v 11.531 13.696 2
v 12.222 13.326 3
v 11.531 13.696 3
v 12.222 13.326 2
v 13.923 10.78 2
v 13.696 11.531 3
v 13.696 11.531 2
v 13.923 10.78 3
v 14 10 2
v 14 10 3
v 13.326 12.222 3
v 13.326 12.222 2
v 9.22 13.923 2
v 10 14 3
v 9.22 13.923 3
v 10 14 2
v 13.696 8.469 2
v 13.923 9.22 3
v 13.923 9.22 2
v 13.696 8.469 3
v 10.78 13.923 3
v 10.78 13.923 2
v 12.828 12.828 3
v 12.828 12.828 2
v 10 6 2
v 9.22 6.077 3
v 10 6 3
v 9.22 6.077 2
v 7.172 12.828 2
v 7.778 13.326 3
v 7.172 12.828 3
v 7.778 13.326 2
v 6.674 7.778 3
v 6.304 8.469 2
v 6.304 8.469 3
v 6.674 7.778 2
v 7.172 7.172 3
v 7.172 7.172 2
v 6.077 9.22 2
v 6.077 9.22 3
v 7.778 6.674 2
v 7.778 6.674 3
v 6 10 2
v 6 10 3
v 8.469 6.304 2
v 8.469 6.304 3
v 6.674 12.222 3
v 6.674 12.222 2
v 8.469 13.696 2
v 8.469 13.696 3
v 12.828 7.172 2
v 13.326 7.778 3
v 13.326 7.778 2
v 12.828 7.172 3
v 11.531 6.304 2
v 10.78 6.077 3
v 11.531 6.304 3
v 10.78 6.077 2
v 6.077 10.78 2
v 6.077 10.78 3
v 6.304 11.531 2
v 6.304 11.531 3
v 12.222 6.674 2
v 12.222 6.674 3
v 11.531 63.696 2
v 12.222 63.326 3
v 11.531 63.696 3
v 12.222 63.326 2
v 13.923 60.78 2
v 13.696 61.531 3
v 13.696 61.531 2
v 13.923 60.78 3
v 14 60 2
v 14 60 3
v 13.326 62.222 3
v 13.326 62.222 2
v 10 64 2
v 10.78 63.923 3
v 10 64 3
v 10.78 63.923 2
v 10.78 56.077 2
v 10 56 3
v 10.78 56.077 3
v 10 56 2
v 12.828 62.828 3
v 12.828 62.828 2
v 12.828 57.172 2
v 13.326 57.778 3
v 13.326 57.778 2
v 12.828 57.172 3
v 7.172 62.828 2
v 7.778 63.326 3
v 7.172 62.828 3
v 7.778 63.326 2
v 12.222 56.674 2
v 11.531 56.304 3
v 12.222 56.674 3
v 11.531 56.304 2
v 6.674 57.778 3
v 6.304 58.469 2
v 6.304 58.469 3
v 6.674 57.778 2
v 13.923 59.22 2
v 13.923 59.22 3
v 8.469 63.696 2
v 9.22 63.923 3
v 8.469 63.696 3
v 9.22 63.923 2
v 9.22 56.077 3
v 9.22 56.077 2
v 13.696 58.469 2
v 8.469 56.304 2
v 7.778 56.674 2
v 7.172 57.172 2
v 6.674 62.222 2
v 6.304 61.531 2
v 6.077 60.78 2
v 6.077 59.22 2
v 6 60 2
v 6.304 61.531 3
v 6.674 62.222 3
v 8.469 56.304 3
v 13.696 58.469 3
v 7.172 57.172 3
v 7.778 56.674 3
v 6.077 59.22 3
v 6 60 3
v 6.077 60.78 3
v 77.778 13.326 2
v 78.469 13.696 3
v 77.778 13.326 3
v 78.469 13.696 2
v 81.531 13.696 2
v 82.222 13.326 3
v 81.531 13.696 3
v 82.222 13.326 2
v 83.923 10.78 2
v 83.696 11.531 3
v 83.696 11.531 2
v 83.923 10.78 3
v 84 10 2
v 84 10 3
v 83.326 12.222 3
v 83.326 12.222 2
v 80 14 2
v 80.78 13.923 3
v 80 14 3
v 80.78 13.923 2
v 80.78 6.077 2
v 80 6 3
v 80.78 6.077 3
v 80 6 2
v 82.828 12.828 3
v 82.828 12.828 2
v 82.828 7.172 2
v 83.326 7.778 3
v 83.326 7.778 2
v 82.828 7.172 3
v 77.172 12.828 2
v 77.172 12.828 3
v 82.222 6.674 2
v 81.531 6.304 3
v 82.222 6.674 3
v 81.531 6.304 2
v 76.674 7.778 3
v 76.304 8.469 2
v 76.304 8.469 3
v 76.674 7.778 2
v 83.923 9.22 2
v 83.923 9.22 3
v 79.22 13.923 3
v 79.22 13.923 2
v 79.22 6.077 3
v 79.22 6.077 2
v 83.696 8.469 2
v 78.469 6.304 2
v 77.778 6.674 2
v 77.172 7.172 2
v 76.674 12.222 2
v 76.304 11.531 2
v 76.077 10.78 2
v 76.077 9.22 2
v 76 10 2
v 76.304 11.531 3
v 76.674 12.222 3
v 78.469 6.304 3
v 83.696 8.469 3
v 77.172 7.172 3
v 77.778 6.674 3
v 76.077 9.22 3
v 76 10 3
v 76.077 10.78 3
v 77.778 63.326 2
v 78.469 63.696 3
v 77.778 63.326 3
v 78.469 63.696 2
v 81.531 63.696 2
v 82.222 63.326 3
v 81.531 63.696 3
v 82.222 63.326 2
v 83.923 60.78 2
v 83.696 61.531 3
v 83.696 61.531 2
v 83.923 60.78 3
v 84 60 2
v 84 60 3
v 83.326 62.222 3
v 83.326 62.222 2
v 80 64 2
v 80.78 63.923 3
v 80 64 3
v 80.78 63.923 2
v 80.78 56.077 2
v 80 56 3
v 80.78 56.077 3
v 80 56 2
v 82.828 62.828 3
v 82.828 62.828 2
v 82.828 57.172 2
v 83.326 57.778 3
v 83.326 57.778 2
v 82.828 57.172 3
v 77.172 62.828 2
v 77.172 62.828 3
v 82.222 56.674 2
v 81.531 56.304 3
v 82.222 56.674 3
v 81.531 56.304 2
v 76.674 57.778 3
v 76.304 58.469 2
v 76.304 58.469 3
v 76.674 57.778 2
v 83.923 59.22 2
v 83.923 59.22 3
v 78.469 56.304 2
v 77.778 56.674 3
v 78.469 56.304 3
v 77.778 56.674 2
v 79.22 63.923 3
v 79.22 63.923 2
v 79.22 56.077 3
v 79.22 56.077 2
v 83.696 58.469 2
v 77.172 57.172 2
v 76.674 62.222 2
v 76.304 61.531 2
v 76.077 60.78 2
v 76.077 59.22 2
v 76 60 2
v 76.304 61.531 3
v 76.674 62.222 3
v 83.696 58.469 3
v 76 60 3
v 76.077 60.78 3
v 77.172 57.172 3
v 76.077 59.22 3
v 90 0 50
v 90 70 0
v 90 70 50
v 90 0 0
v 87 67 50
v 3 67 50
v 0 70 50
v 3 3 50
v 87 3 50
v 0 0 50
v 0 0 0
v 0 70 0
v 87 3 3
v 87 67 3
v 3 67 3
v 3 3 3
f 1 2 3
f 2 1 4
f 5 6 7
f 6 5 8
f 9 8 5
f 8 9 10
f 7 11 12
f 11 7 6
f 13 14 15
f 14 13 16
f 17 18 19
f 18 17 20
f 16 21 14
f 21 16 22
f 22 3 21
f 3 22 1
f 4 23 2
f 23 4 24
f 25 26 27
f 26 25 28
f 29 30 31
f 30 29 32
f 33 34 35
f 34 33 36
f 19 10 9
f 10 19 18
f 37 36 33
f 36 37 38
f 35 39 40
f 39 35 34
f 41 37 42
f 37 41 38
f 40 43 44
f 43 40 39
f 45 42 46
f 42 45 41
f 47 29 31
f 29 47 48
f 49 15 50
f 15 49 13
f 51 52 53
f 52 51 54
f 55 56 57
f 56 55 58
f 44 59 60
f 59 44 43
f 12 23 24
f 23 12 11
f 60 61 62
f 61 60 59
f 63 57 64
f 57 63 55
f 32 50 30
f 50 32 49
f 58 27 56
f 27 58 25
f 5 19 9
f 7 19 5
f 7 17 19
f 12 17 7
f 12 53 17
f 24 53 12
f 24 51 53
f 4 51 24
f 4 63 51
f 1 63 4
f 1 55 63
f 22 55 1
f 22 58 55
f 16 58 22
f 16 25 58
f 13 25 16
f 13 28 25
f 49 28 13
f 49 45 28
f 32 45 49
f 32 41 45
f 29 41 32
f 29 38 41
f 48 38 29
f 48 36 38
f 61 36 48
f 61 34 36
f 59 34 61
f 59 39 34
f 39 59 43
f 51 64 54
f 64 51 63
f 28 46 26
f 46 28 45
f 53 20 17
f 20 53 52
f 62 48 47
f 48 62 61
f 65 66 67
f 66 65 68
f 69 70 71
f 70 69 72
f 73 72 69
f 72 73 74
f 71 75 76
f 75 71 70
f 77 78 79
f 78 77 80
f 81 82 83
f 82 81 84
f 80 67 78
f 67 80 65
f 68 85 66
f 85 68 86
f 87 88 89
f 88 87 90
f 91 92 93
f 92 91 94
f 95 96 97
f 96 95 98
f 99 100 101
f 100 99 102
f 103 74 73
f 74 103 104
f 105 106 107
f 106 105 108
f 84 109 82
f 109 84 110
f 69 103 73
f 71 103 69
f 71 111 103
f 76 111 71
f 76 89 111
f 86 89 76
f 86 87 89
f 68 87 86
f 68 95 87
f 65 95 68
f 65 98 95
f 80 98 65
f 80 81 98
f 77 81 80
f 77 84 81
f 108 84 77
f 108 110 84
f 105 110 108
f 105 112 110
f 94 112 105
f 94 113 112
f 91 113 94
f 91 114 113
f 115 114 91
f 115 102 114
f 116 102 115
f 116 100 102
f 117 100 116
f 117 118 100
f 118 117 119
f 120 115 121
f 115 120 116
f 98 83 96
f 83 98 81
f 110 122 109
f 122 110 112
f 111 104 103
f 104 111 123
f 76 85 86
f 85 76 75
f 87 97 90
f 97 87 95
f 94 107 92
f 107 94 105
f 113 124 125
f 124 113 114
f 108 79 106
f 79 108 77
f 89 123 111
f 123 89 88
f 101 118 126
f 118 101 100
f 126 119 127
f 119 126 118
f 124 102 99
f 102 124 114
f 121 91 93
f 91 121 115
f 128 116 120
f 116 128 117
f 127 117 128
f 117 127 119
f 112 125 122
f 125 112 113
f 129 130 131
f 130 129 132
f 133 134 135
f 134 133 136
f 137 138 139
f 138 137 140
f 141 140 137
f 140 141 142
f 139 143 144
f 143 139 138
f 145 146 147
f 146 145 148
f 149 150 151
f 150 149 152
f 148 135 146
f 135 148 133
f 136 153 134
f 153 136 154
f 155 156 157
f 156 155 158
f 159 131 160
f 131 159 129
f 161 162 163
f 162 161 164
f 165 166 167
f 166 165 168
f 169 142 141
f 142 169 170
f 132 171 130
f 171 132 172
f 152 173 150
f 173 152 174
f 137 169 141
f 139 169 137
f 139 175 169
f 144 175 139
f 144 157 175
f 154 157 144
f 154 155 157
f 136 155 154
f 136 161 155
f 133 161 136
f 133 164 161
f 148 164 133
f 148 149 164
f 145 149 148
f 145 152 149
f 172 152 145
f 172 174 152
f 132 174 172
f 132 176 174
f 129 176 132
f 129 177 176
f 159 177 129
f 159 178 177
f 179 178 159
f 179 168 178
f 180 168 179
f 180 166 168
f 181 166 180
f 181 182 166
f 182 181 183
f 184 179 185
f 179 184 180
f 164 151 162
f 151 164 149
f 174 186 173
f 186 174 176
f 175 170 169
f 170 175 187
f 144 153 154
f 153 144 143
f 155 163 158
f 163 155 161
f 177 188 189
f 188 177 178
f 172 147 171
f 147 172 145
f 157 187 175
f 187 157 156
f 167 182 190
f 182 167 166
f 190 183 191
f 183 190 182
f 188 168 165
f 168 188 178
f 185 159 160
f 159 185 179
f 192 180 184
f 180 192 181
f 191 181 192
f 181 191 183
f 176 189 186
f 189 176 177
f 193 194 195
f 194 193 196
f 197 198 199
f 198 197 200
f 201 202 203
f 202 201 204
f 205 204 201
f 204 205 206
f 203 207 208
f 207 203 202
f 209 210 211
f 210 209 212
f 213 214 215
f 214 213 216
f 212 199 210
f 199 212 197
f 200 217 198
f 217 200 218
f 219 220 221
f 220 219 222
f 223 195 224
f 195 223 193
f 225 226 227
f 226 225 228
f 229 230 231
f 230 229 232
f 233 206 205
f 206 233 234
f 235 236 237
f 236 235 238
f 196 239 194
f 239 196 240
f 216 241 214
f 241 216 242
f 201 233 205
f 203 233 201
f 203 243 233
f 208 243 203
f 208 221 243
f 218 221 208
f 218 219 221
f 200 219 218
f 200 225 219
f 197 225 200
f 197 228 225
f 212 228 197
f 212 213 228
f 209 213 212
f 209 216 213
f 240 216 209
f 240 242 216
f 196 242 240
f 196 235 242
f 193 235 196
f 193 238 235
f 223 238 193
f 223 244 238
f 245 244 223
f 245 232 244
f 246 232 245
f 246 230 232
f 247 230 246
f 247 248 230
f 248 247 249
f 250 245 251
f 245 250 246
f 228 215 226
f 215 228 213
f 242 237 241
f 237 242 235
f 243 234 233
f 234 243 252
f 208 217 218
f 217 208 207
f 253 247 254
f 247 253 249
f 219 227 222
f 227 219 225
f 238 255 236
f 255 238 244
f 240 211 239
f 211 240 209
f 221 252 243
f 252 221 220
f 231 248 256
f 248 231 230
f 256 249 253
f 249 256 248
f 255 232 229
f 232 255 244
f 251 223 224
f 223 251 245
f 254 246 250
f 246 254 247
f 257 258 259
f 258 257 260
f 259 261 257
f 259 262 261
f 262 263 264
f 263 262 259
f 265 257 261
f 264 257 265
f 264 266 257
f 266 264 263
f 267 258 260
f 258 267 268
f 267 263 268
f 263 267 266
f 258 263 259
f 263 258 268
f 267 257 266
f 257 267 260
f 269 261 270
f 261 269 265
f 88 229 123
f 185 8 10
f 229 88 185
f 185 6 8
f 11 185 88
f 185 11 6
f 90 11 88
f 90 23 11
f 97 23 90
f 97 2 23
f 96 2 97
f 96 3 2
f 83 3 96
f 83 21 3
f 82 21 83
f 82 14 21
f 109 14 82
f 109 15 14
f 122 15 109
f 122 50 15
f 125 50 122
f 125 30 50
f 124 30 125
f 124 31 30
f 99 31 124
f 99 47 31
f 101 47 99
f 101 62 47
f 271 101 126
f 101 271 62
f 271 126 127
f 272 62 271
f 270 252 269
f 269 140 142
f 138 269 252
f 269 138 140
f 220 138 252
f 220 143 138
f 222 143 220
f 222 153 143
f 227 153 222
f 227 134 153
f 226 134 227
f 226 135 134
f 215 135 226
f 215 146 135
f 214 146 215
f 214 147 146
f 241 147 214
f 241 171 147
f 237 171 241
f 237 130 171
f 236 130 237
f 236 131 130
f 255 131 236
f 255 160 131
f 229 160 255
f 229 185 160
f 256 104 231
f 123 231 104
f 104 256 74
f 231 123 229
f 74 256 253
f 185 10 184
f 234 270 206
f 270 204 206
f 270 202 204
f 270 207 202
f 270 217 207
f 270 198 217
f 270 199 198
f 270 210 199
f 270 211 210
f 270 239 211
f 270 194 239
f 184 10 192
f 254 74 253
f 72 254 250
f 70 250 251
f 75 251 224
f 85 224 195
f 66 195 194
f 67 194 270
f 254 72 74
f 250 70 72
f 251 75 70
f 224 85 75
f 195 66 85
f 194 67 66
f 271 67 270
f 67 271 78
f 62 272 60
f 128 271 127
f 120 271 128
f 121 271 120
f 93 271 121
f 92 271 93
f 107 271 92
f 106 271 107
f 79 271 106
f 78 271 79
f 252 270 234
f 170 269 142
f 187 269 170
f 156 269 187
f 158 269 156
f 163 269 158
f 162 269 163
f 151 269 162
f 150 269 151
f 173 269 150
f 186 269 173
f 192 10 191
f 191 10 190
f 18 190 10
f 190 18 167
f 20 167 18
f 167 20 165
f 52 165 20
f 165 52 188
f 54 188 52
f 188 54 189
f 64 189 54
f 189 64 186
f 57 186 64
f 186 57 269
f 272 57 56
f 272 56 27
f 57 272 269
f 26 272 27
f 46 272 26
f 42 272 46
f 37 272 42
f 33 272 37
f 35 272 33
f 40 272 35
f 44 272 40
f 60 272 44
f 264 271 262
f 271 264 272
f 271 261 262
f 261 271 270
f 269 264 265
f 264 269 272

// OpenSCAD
$fn = 32;

// ----------------------------------------------------------------------
// Enclosure box: bosses enclosure
// ----------------------------------------------------------------------

// --- parameters (mm) ---
box_l = 90;               // outer length, X
box_w = 70;               // outer width, Y
box_h = 50;               // outer height
wall_t = 3;               // wall thickness
boss_r = 4;               // corner boss radius
hole_r = 2;               // boss screw hole radius
boss_in = 10;             // boss inset from the corners
fit_tol = 0.05;           // tolerance for press fits, mm
free_tol = 0.3;           // tolerance for clearance fits, mm

inner_h = box_h - wall_t;  // cavity depth
boss_h = inner_h - 2;  // corner boss height

difference() {
  cube([box_l, box_w, box_h]);
  translate([wall_t, wall_t, wall_t])
    cube([box_l - 2 * wall_t, box_w - 2 * wall_t, box_h]);
  for (sx = [0, 1], sy = [0, 1])
    translate([sx ? box_l - boss_in : boss_in,
               sy ? box_w - boss_in : boss_in, wall_t - 1]) {
      cylinder(r = boss_r, h = boss_h);
      translate([0, 0, boss_h - 4])
        cylinder(r = hole_r, h = 5);
    }
}
